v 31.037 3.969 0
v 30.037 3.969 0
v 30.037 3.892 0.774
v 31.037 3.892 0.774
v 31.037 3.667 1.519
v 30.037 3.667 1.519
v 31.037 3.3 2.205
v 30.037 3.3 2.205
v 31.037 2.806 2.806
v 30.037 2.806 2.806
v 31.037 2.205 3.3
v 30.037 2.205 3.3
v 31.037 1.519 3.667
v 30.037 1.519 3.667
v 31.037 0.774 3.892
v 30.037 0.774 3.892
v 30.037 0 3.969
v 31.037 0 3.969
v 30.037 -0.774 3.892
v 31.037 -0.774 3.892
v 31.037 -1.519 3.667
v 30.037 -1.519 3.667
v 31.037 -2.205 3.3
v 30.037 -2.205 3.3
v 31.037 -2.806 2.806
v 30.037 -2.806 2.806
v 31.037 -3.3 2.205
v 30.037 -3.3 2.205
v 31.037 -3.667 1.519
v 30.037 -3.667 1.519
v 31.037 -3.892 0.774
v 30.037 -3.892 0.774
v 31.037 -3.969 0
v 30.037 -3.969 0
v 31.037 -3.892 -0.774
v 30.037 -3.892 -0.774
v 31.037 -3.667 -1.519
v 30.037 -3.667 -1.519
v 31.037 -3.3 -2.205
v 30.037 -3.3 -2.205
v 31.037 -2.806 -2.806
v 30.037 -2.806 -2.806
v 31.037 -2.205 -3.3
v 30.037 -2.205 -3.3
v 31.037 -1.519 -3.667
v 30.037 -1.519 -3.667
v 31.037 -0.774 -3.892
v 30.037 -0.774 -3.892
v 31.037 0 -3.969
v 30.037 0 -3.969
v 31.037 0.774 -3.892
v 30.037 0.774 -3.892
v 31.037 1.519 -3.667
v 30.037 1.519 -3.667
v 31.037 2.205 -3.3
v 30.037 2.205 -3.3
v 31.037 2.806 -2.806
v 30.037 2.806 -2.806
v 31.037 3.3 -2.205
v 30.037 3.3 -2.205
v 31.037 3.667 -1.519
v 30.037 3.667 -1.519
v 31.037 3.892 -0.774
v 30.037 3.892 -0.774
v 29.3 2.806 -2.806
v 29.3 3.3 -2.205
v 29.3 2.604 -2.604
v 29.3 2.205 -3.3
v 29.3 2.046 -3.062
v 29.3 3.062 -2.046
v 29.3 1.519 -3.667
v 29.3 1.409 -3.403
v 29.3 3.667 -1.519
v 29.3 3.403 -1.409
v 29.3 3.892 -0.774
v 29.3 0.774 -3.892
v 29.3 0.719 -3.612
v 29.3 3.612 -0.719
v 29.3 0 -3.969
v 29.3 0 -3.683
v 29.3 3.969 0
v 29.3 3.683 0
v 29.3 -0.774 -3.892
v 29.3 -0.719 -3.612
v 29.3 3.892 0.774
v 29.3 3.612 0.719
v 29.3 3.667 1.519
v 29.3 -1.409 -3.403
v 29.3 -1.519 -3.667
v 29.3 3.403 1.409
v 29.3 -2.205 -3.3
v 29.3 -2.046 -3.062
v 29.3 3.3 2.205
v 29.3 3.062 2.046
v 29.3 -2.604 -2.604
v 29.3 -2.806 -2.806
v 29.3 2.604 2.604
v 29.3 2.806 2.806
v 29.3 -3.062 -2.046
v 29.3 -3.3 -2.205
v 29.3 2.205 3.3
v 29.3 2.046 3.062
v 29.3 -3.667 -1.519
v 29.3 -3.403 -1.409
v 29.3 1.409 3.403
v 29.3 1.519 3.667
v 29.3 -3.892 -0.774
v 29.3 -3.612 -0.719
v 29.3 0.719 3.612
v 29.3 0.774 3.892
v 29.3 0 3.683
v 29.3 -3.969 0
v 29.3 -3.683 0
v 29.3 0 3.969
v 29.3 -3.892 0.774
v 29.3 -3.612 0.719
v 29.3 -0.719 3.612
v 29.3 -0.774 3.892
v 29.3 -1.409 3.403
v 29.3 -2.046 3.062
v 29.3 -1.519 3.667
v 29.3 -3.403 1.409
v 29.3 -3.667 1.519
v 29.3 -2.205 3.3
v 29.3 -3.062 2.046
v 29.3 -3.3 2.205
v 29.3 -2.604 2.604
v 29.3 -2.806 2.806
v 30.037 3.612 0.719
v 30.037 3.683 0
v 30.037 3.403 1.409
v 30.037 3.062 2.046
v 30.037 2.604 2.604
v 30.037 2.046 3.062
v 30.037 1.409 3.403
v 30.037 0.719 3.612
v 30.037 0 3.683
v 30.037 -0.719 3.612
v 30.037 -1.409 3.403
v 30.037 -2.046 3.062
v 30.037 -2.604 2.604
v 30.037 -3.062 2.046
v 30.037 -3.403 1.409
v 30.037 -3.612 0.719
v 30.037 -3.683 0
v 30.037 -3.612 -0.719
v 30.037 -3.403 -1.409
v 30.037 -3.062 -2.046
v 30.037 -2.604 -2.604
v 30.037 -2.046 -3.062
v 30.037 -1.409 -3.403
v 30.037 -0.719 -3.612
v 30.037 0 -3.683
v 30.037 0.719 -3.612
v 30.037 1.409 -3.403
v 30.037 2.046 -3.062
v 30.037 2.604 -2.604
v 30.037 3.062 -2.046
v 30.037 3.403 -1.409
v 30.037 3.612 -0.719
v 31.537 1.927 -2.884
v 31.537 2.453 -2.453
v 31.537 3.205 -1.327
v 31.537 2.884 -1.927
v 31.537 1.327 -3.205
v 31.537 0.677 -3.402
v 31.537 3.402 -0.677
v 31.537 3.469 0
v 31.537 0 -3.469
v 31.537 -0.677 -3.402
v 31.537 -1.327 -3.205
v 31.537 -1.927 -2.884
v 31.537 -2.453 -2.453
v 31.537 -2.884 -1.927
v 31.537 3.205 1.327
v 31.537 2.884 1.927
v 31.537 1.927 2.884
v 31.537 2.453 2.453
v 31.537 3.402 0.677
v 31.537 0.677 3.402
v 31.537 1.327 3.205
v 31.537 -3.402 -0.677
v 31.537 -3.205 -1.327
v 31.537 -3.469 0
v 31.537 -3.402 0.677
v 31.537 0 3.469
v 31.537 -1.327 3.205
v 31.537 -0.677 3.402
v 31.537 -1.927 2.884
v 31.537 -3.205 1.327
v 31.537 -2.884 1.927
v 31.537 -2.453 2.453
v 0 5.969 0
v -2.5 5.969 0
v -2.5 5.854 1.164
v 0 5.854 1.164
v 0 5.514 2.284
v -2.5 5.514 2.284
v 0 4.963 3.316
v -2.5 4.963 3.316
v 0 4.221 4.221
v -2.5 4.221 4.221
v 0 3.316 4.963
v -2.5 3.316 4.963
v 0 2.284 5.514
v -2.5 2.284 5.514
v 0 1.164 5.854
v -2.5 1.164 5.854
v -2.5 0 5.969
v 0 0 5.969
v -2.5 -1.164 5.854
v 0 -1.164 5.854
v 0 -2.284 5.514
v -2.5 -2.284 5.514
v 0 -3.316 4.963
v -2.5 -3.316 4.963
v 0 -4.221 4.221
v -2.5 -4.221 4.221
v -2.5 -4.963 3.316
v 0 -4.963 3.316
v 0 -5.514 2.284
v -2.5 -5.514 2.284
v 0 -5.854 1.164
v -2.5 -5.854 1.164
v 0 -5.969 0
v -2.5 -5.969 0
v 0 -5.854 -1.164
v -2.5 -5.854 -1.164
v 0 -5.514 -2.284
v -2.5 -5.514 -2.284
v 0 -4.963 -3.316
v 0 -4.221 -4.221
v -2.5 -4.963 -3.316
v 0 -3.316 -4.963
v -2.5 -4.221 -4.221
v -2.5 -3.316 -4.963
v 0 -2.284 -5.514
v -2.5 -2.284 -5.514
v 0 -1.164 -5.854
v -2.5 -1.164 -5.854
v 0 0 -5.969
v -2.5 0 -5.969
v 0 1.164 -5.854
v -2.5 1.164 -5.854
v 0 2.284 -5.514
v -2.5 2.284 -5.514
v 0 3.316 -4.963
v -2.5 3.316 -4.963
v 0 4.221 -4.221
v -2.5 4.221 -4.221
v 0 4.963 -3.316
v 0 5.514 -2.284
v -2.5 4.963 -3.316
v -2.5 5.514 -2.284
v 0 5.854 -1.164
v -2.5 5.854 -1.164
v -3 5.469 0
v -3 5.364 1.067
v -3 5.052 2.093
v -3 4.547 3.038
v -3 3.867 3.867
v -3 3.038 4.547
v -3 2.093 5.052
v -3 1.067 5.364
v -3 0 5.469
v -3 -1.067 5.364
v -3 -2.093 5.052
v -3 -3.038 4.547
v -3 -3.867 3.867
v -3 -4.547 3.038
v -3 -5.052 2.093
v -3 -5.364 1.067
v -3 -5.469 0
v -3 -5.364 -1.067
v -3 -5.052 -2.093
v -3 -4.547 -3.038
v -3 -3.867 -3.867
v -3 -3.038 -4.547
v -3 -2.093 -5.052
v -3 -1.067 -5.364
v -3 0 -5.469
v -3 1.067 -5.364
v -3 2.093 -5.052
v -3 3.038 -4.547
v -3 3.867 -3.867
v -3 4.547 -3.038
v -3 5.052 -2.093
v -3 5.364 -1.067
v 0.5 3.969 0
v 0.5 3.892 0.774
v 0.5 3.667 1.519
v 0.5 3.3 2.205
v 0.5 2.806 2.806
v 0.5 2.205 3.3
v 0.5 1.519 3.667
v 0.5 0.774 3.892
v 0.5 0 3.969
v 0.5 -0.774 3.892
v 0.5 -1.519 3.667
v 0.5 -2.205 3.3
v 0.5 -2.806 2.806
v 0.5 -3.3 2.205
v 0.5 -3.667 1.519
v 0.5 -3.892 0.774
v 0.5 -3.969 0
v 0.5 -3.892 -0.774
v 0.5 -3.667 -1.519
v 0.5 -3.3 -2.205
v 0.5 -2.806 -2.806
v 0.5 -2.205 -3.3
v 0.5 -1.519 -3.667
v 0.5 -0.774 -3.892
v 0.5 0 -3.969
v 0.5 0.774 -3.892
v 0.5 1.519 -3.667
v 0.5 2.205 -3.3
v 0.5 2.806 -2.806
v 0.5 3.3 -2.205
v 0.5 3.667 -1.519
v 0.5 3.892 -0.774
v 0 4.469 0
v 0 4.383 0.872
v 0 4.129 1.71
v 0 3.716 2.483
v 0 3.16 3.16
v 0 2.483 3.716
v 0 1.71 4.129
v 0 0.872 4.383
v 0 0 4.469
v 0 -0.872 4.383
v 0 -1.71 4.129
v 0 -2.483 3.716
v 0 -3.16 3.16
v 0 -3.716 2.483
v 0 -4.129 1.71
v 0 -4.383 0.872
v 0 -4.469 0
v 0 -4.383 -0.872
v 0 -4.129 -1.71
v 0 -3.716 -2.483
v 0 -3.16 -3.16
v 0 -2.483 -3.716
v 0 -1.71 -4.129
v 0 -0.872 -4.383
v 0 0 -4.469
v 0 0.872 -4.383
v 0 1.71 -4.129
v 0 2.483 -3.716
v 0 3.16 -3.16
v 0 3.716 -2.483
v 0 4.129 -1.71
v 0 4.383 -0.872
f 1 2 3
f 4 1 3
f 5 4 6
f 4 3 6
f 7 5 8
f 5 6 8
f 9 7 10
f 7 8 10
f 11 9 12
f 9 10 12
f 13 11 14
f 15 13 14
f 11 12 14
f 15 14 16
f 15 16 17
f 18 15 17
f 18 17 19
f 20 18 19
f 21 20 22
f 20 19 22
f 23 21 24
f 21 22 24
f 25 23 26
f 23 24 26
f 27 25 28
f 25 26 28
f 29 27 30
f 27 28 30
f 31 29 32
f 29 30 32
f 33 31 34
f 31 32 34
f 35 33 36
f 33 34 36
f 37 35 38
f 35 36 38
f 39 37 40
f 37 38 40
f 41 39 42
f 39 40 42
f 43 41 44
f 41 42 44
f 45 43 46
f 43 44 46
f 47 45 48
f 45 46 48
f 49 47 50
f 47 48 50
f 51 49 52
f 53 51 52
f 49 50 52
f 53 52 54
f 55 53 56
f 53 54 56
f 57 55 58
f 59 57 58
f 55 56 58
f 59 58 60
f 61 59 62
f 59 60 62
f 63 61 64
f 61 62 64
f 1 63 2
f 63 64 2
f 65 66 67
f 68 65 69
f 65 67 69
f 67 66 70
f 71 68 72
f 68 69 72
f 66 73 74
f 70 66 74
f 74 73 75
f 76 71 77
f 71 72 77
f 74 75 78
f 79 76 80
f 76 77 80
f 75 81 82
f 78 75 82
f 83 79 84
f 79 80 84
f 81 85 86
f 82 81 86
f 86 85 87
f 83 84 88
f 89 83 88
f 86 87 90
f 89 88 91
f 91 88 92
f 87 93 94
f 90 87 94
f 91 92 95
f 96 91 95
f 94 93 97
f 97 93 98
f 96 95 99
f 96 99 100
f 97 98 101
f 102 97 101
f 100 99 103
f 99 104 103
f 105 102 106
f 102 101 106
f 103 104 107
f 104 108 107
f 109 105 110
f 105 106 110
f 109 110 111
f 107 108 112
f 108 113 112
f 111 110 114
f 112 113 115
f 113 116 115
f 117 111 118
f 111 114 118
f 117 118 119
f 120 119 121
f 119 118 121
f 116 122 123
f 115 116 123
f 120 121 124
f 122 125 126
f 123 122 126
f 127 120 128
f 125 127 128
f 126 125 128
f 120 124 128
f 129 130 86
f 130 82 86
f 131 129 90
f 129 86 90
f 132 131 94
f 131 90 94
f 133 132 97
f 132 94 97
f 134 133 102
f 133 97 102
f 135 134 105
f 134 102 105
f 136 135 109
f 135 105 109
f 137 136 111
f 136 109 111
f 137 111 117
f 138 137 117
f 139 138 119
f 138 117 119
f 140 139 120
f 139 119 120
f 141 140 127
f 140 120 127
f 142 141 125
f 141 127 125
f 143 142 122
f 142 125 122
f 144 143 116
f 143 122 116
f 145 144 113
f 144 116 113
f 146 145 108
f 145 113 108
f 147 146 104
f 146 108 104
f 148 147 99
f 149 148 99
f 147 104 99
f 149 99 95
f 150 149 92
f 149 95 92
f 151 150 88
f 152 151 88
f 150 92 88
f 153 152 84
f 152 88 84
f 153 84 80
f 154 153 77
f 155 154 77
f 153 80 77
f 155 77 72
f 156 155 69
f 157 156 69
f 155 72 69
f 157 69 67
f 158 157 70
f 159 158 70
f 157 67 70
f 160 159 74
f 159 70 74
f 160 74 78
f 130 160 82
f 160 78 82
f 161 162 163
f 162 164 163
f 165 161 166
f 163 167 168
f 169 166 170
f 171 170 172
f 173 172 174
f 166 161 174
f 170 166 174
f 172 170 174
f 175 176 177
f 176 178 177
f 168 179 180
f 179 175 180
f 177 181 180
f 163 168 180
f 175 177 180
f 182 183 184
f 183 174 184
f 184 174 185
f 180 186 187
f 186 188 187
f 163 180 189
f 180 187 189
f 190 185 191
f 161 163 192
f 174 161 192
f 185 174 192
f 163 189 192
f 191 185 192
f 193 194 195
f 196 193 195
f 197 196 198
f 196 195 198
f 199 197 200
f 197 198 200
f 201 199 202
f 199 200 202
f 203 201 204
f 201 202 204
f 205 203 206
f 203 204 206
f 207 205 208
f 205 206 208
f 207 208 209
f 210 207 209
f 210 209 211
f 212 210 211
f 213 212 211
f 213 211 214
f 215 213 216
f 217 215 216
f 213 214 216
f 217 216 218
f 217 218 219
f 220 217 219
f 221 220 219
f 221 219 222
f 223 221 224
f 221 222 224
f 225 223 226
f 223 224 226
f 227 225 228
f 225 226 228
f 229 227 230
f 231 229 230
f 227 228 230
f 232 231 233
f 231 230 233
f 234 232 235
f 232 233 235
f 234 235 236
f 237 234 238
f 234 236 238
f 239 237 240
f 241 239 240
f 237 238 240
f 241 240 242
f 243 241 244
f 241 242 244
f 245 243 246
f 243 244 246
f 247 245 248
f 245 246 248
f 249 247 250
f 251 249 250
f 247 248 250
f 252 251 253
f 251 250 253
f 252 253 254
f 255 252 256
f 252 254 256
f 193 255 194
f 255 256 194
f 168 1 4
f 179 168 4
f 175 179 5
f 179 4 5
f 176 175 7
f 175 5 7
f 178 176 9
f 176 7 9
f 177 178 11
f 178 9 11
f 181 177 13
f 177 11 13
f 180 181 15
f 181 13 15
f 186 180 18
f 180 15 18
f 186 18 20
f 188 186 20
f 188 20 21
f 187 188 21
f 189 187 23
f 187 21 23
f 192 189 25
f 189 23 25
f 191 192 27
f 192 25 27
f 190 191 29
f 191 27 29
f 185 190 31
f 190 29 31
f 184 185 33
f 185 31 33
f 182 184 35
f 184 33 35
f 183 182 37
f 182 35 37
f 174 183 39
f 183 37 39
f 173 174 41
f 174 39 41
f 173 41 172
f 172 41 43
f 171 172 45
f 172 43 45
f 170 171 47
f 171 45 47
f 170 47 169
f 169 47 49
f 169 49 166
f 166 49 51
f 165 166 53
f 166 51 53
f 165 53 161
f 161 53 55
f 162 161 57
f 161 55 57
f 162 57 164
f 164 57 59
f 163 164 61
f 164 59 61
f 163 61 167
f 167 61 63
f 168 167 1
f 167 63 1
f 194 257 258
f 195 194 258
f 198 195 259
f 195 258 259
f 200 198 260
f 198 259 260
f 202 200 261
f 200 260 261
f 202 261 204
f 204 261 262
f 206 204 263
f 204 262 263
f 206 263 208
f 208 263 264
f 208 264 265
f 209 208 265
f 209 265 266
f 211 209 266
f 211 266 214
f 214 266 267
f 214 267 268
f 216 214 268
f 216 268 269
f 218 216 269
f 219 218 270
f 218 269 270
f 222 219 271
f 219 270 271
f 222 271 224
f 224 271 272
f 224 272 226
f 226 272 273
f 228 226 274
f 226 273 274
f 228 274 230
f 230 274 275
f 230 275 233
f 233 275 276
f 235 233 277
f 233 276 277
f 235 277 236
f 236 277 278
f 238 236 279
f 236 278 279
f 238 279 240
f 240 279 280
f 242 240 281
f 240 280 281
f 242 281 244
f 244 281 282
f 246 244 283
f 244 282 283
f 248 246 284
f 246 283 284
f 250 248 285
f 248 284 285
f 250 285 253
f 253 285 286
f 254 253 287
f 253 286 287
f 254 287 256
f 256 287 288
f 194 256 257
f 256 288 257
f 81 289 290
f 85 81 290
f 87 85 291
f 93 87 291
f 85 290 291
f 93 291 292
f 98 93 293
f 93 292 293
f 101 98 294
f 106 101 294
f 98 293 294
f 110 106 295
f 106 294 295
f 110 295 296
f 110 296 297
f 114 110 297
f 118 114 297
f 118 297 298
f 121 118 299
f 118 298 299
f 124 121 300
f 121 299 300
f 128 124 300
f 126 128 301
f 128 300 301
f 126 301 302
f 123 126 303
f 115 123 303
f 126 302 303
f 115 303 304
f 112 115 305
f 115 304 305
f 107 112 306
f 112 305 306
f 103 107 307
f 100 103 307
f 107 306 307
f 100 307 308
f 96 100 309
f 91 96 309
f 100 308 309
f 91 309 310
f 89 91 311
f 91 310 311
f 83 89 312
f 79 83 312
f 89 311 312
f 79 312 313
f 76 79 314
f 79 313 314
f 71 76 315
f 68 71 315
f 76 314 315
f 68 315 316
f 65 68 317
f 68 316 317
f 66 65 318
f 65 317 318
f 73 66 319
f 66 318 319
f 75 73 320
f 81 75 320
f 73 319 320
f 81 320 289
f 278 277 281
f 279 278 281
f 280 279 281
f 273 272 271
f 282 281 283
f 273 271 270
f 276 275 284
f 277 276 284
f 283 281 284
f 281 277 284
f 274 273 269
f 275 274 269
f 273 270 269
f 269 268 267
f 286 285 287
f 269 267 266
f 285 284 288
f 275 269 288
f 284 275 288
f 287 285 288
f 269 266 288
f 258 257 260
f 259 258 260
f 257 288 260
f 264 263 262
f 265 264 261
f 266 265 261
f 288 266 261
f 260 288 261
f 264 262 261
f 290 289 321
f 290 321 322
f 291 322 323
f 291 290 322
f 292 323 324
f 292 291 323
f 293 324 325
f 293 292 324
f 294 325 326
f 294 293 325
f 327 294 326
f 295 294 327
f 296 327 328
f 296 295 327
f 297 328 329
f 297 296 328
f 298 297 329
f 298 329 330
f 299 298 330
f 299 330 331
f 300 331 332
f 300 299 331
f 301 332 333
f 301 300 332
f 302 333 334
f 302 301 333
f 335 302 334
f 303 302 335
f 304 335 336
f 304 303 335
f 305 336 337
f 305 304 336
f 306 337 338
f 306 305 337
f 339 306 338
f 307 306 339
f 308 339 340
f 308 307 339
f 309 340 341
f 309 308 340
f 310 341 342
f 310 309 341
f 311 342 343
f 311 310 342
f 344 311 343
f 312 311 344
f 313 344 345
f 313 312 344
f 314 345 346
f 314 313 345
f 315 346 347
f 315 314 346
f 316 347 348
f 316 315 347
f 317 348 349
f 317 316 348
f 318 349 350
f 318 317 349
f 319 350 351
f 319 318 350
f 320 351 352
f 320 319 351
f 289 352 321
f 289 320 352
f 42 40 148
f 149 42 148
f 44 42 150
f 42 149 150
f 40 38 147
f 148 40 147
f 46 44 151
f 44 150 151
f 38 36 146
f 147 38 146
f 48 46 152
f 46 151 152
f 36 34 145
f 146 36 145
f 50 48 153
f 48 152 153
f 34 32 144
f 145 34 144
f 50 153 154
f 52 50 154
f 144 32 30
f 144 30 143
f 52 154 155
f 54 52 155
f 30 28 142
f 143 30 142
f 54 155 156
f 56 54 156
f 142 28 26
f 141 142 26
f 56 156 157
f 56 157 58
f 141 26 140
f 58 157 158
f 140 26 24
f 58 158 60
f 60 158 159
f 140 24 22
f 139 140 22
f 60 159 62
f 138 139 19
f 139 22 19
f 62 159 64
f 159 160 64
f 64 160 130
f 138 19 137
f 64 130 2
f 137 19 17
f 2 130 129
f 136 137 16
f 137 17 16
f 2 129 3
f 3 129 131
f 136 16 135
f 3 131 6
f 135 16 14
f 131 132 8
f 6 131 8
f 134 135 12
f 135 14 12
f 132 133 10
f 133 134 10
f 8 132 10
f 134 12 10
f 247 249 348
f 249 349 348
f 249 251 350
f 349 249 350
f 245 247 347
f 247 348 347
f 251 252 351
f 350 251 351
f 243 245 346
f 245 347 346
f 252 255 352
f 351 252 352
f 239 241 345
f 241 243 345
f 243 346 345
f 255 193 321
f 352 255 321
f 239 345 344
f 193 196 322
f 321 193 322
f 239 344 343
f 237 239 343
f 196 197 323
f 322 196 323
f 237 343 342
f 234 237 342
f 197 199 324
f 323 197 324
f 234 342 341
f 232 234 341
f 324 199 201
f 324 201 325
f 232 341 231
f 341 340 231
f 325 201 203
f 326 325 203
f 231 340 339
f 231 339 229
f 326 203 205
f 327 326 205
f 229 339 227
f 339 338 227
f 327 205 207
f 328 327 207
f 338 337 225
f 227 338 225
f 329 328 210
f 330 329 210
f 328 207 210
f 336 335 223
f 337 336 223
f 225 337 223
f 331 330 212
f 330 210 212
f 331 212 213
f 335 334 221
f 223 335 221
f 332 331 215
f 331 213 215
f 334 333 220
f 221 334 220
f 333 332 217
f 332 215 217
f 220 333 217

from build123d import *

# Parameters (mm, degrees)
CHAMFER1_SIZE = 0.5


with BuildPart() as part:
    # Sketch1 → Revolve1 (revolve)
    with BuildSketch(Plane.XY):
        Polygon((0, 3.96875), (0, 5.96875), (-3, 5.96875), (-3, 0), (31.5366, 0), (31.5366, 3.96875), (30.0366, 3.96875), (30.0366, 3.683), (29.3, 3.683), (29.3, 3.96875), align=None)
    revolve(axis=Axis((-20.199082849, 0, 0), (1, 0, 0)))

    # Chamfer1
    chamfer1_edges = [part.edges().sort_by_distance(p)[0] for p in [
        (0, -3.96875, 0),
        (-3, -5.96875, 0),
        (31.5366, -3.96875, 0),
    ]]
    chamfer(chamfer1_edges, length=CHAMFER1_SIZE)


solid = part.part
